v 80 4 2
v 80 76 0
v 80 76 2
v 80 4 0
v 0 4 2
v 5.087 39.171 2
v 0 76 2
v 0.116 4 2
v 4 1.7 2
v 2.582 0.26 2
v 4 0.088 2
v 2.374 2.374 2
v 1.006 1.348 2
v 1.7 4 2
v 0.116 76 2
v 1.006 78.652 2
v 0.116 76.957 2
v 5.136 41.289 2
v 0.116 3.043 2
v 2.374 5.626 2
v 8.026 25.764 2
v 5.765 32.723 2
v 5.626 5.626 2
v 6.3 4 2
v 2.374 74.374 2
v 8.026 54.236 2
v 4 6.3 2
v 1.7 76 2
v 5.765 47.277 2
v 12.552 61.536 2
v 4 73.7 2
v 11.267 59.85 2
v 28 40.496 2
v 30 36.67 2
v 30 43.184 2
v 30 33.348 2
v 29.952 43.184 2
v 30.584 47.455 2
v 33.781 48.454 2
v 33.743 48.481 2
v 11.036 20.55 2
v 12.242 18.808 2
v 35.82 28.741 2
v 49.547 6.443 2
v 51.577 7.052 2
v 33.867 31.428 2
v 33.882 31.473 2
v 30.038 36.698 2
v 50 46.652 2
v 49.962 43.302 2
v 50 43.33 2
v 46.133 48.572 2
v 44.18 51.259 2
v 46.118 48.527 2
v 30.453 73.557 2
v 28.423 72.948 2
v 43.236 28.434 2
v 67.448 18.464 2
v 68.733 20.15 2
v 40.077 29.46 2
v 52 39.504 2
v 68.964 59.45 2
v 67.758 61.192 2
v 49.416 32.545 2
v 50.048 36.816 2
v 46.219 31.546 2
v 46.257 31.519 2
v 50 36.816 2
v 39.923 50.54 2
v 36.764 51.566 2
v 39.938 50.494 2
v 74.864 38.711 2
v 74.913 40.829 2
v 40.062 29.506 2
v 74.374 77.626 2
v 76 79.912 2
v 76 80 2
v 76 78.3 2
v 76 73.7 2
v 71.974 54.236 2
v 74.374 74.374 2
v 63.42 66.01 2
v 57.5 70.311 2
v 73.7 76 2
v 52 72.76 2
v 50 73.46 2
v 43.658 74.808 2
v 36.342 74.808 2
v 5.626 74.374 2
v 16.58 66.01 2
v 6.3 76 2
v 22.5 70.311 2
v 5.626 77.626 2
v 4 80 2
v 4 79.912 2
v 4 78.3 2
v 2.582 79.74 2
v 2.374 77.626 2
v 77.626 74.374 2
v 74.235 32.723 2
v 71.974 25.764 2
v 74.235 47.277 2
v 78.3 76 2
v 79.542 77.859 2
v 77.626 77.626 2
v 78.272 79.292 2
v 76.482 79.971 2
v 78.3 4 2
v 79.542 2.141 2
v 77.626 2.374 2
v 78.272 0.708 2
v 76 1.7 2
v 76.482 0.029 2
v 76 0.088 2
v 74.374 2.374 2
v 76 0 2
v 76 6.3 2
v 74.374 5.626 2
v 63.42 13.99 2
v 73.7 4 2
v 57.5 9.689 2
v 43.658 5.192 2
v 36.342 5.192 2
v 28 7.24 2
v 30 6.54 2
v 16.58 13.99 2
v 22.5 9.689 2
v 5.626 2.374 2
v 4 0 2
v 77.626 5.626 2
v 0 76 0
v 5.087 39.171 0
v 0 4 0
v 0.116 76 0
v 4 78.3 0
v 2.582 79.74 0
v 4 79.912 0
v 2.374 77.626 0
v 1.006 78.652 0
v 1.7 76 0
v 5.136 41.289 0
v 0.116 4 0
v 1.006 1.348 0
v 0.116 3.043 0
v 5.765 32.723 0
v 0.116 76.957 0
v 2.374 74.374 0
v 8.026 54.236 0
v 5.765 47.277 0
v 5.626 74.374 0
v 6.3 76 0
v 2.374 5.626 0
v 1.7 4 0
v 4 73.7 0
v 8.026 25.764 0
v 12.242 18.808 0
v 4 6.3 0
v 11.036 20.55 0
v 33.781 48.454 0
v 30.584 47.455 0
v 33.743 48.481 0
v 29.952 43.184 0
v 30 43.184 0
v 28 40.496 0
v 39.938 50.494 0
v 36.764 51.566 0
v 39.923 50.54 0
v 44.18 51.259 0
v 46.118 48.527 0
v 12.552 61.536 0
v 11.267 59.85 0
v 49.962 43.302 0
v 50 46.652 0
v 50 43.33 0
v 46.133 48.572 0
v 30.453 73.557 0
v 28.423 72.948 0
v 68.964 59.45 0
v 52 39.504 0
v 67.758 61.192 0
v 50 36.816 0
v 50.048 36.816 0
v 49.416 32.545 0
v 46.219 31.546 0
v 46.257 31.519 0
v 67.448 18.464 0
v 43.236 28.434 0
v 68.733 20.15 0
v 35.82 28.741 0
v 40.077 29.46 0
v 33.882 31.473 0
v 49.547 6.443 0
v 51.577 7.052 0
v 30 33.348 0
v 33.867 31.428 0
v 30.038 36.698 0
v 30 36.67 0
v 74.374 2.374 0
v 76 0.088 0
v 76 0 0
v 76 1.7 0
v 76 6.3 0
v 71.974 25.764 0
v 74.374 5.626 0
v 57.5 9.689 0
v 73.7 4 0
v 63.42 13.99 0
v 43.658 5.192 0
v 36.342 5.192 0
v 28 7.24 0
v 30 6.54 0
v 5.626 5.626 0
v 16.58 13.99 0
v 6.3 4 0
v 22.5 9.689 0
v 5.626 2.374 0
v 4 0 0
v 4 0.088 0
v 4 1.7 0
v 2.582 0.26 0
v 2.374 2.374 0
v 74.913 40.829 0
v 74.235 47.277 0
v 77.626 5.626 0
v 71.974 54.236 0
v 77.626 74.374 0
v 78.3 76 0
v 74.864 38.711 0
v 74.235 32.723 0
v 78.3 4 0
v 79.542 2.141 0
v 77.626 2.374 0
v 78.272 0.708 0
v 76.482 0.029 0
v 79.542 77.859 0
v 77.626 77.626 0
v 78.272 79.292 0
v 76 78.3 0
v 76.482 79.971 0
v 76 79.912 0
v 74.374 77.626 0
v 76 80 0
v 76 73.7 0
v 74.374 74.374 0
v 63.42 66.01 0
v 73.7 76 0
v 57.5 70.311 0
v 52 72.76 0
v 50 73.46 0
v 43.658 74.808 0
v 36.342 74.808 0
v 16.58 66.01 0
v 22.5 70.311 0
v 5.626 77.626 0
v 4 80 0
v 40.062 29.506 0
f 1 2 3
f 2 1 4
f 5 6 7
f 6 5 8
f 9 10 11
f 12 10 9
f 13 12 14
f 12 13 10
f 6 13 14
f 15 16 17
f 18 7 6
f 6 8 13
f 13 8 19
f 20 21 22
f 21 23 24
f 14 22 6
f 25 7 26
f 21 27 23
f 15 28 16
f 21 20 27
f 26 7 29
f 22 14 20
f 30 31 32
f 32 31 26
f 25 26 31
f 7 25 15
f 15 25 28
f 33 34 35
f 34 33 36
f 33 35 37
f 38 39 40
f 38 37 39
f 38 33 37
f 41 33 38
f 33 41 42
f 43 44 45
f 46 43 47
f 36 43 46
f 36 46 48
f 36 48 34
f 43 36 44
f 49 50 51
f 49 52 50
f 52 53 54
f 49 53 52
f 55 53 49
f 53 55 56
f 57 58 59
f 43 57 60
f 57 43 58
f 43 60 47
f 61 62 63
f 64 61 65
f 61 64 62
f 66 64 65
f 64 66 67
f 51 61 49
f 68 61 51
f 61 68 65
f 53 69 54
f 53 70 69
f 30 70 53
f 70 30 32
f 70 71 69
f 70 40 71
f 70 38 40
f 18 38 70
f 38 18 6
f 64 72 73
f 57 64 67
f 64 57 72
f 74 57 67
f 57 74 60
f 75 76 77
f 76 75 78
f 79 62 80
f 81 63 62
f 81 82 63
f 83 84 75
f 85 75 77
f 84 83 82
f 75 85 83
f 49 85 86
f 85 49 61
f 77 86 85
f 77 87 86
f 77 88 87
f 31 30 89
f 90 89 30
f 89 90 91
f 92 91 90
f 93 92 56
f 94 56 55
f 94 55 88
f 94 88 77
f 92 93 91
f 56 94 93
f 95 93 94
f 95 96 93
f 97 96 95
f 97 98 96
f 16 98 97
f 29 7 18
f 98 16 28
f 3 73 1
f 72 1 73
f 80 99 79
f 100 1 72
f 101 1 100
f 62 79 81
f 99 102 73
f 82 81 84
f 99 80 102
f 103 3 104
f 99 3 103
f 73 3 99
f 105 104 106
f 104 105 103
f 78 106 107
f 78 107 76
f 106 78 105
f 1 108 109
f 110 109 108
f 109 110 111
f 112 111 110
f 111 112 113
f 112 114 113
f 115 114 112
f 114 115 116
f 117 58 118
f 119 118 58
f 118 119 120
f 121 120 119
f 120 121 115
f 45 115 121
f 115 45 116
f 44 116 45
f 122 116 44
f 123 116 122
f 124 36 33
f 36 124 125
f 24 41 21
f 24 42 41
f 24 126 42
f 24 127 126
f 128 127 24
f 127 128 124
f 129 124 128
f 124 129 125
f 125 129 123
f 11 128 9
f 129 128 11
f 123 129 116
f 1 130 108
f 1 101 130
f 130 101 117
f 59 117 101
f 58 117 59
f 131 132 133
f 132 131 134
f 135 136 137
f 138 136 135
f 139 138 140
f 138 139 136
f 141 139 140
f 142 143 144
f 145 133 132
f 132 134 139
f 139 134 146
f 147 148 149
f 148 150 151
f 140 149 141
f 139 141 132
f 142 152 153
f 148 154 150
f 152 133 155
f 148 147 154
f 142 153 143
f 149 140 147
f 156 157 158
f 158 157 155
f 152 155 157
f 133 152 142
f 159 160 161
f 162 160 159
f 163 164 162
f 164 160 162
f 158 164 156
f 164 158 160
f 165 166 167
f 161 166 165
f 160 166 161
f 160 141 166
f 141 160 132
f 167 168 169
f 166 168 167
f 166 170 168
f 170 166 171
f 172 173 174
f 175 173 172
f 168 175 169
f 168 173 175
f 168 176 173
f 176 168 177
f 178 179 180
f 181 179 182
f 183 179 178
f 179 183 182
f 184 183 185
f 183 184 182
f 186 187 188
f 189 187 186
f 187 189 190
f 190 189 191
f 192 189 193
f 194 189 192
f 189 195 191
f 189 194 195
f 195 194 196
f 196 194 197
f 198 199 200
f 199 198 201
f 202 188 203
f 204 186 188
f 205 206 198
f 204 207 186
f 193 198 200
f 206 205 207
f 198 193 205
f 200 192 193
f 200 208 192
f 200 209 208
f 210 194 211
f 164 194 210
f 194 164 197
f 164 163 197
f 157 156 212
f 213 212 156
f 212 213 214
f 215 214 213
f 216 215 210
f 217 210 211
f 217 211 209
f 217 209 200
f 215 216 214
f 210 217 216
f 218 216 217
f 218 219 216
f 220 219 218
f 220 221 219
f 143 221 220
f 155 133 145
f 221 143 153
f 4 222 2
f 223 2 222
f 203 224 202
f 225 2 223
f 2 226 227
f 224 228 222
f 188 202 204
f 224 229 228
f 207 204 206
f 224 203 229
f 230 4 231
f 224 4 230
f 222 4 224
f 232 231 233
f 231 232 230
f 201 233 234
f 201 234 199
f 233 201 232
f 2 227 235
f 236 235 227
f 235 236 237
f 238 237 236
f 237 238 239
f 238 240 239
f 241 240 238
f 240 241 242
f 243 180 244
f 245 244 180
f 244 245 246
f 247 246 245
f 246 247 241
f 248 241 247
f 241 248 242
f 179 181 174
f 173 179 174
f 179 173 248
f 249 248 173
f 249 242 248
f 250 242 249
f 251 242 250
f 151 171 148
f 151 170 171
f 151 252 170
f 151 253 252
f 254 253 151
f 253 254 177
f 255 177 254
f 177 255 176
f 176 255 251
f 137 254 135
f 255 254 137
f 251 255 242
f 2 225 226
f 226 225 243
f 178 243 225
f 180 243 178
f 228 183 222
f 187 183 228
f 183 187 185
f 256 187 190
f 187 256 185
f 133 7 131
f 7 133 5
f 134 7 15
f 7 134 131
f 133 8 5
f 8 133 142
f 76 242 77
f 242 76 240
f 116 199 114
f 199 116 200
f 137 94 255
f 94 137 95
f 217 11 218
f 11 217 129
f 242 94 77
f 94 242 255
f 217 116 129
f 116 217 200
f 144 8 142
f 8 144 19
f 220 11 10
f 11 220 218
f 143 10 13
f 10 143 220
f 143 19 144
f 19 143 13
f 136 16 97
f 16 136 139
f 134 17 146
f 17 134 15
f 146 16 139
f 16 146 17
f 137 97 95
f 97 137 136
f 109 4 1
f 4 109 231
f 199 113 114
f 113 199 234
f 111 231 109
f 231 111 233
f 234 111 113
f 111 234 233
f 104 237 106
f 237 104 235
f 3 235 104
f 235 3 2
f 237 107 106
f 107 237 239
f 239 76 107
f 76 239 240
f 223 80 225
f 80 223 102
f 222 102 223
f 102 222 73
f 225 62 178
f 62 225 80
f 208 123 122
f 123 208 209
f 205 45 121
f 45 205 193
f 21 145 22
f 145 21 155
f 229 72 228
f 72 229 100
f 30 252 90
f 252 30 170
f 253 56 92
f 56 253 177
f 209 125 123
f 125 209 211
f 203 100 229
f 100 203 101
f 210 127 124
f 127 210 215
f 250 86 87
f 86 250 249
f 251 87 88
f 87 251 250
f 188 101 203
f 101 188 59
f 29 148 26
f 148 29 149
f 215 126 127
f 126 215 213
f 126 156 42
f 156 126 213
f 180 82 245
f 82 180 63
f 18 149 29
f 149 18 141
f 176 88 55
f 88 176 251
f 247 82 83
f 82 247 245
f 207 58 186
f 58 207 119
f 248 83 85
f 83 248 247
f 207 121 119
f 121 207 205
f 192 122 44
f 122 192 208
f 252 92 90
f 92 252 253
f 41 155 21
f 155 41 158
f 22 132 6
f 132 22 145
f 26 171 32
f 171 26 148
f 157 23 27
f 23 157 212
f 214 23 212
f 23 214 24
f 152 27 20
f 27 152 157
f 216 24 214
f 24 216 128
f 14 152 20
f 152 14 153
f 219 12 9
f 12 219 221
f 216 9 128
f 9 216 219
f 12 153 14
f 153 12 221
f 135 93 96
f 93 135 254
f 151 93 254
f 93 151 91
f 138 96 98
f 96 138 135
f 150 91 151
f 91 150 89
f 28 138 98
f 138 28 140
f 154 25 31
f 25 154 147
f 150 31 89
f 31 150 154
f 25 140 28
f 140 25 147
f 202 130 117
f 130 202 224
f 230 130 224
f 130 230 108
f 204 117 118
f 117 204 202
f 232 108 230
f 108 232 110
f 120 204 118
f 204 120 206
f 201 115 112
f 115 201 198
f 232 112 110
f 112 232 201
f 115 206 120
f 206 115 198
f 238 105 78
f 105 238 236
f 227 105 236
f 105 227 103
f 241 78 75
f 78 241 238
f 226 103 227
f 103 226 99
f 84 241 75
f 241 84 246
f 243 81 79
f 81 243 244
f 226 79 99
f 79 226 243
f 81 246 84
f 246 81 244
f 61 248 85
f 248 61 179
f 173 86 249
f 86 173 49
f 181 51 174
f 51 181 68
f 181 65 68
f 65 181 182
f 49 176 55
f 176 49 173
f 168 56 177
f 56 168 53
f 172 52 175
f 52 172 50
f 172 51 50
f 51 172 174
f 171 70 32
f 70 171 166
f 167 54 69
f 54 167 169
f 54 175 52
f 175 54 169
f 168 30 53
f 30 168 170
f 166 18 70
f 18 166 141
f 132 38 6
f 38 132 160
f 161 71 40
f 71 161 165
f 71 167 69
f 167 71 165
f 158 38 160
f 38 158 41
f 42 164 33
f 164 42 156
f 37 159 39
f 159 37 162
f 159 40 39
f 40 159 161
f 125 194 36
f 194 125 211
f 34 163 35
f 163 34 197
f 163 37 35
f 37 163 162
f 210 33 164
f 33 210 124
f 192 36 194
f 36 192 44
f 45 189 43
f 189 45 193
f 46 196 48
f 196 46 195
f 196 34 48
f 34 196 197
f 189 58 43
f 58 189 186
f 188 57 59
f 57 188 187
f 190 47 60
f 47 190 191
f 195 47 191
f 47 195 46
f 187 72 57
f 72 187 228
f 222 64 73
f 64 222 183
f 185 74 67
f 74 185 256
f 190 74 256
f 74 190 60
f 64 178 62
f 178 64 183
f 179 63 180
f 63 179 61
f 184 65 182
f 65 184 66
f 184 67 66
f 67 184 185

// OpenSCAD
/* [Body Parameters] */
// Fan Size
size=80;
// Border Width
borderthickness=5;
// Corner Radius 
cornerradius=4;
// Sheet Thickness 
thickness=2;

/* [Screw Hole Parameters] */
// Screw Radius 
screwradius=2.3;
// Screw Inset From Corder
screwinset=4;

/* [Spine Parameters] */
// Number of Spines
spines=10;
// Spine Thickness
spinesize=2;
// Spine Offset from center
spineoffset=10;
// Spine Extra Rotation
spinerotation=0;

/* [Hidden] */
dxf=false;
// Below are not parameters //

// Calculate helper variables
holeradius=size/2-borderthickness;

// Create the grill
if (dxf)
	projection(cut=false) fan_grill();
else
	fan_grill();

module fan_grill()
{
	union()
	{
		difference()
		{
			body();

			// hole
			translate([size/2,size/2,-thickness/4]) cylinder(r=holeradius,h=thickness*2);

			// screws
			translate([screwinset,screwinset,0]) cylinder(r=screwradius,h=thickness);
			translate([screwinset,size-screwinset,0]) cylinder(r=screwradius,h=thickness);
			translate([size-screwinset,screwinset,0]) cylinder(r=screwradius,h=thickness);
			translate([size-screwinset,size-screwinset,0]) cylinder(r=screwradius,h=thickness);
		}
		translate([size/2,size/2,0])
		interrior();
	}
}

module body()
{
	union()
	{
		translate([0,cornerradius,0]) cube(size=[size,size-(cornerradius*2),thickness]);
		translate([cornerradius,0,0]) cube(size=[size-(cornerradius*2),size,thickness]);
		translate([cornerradius,cornerradius,0]) cylinder(r=cornerradius,h=thickness);
		translate([cornerradius,size-cornerradius,0]) cylinder(r=cornerradius,h=thickness);
		translate([size-cornerradius,cornerradius,0]) cylinder(r=cornerradius,h=thickness);
		translate([size-cornerradius,size-cornerradius,0]) cylinder(r=cornerradius,h=thickness);
	}
}

module interrior()
{
	for(i=[0:spines-1])
	{
		  rotate(a=[0,0,i*(360.0/spines)+spinerotation]) 
		  translate([spineoffset,-spineoffset/3.141,0])
		  cube([spinesize,holeradius+(spineoffset/3.141),spinesize]);
	}
}
